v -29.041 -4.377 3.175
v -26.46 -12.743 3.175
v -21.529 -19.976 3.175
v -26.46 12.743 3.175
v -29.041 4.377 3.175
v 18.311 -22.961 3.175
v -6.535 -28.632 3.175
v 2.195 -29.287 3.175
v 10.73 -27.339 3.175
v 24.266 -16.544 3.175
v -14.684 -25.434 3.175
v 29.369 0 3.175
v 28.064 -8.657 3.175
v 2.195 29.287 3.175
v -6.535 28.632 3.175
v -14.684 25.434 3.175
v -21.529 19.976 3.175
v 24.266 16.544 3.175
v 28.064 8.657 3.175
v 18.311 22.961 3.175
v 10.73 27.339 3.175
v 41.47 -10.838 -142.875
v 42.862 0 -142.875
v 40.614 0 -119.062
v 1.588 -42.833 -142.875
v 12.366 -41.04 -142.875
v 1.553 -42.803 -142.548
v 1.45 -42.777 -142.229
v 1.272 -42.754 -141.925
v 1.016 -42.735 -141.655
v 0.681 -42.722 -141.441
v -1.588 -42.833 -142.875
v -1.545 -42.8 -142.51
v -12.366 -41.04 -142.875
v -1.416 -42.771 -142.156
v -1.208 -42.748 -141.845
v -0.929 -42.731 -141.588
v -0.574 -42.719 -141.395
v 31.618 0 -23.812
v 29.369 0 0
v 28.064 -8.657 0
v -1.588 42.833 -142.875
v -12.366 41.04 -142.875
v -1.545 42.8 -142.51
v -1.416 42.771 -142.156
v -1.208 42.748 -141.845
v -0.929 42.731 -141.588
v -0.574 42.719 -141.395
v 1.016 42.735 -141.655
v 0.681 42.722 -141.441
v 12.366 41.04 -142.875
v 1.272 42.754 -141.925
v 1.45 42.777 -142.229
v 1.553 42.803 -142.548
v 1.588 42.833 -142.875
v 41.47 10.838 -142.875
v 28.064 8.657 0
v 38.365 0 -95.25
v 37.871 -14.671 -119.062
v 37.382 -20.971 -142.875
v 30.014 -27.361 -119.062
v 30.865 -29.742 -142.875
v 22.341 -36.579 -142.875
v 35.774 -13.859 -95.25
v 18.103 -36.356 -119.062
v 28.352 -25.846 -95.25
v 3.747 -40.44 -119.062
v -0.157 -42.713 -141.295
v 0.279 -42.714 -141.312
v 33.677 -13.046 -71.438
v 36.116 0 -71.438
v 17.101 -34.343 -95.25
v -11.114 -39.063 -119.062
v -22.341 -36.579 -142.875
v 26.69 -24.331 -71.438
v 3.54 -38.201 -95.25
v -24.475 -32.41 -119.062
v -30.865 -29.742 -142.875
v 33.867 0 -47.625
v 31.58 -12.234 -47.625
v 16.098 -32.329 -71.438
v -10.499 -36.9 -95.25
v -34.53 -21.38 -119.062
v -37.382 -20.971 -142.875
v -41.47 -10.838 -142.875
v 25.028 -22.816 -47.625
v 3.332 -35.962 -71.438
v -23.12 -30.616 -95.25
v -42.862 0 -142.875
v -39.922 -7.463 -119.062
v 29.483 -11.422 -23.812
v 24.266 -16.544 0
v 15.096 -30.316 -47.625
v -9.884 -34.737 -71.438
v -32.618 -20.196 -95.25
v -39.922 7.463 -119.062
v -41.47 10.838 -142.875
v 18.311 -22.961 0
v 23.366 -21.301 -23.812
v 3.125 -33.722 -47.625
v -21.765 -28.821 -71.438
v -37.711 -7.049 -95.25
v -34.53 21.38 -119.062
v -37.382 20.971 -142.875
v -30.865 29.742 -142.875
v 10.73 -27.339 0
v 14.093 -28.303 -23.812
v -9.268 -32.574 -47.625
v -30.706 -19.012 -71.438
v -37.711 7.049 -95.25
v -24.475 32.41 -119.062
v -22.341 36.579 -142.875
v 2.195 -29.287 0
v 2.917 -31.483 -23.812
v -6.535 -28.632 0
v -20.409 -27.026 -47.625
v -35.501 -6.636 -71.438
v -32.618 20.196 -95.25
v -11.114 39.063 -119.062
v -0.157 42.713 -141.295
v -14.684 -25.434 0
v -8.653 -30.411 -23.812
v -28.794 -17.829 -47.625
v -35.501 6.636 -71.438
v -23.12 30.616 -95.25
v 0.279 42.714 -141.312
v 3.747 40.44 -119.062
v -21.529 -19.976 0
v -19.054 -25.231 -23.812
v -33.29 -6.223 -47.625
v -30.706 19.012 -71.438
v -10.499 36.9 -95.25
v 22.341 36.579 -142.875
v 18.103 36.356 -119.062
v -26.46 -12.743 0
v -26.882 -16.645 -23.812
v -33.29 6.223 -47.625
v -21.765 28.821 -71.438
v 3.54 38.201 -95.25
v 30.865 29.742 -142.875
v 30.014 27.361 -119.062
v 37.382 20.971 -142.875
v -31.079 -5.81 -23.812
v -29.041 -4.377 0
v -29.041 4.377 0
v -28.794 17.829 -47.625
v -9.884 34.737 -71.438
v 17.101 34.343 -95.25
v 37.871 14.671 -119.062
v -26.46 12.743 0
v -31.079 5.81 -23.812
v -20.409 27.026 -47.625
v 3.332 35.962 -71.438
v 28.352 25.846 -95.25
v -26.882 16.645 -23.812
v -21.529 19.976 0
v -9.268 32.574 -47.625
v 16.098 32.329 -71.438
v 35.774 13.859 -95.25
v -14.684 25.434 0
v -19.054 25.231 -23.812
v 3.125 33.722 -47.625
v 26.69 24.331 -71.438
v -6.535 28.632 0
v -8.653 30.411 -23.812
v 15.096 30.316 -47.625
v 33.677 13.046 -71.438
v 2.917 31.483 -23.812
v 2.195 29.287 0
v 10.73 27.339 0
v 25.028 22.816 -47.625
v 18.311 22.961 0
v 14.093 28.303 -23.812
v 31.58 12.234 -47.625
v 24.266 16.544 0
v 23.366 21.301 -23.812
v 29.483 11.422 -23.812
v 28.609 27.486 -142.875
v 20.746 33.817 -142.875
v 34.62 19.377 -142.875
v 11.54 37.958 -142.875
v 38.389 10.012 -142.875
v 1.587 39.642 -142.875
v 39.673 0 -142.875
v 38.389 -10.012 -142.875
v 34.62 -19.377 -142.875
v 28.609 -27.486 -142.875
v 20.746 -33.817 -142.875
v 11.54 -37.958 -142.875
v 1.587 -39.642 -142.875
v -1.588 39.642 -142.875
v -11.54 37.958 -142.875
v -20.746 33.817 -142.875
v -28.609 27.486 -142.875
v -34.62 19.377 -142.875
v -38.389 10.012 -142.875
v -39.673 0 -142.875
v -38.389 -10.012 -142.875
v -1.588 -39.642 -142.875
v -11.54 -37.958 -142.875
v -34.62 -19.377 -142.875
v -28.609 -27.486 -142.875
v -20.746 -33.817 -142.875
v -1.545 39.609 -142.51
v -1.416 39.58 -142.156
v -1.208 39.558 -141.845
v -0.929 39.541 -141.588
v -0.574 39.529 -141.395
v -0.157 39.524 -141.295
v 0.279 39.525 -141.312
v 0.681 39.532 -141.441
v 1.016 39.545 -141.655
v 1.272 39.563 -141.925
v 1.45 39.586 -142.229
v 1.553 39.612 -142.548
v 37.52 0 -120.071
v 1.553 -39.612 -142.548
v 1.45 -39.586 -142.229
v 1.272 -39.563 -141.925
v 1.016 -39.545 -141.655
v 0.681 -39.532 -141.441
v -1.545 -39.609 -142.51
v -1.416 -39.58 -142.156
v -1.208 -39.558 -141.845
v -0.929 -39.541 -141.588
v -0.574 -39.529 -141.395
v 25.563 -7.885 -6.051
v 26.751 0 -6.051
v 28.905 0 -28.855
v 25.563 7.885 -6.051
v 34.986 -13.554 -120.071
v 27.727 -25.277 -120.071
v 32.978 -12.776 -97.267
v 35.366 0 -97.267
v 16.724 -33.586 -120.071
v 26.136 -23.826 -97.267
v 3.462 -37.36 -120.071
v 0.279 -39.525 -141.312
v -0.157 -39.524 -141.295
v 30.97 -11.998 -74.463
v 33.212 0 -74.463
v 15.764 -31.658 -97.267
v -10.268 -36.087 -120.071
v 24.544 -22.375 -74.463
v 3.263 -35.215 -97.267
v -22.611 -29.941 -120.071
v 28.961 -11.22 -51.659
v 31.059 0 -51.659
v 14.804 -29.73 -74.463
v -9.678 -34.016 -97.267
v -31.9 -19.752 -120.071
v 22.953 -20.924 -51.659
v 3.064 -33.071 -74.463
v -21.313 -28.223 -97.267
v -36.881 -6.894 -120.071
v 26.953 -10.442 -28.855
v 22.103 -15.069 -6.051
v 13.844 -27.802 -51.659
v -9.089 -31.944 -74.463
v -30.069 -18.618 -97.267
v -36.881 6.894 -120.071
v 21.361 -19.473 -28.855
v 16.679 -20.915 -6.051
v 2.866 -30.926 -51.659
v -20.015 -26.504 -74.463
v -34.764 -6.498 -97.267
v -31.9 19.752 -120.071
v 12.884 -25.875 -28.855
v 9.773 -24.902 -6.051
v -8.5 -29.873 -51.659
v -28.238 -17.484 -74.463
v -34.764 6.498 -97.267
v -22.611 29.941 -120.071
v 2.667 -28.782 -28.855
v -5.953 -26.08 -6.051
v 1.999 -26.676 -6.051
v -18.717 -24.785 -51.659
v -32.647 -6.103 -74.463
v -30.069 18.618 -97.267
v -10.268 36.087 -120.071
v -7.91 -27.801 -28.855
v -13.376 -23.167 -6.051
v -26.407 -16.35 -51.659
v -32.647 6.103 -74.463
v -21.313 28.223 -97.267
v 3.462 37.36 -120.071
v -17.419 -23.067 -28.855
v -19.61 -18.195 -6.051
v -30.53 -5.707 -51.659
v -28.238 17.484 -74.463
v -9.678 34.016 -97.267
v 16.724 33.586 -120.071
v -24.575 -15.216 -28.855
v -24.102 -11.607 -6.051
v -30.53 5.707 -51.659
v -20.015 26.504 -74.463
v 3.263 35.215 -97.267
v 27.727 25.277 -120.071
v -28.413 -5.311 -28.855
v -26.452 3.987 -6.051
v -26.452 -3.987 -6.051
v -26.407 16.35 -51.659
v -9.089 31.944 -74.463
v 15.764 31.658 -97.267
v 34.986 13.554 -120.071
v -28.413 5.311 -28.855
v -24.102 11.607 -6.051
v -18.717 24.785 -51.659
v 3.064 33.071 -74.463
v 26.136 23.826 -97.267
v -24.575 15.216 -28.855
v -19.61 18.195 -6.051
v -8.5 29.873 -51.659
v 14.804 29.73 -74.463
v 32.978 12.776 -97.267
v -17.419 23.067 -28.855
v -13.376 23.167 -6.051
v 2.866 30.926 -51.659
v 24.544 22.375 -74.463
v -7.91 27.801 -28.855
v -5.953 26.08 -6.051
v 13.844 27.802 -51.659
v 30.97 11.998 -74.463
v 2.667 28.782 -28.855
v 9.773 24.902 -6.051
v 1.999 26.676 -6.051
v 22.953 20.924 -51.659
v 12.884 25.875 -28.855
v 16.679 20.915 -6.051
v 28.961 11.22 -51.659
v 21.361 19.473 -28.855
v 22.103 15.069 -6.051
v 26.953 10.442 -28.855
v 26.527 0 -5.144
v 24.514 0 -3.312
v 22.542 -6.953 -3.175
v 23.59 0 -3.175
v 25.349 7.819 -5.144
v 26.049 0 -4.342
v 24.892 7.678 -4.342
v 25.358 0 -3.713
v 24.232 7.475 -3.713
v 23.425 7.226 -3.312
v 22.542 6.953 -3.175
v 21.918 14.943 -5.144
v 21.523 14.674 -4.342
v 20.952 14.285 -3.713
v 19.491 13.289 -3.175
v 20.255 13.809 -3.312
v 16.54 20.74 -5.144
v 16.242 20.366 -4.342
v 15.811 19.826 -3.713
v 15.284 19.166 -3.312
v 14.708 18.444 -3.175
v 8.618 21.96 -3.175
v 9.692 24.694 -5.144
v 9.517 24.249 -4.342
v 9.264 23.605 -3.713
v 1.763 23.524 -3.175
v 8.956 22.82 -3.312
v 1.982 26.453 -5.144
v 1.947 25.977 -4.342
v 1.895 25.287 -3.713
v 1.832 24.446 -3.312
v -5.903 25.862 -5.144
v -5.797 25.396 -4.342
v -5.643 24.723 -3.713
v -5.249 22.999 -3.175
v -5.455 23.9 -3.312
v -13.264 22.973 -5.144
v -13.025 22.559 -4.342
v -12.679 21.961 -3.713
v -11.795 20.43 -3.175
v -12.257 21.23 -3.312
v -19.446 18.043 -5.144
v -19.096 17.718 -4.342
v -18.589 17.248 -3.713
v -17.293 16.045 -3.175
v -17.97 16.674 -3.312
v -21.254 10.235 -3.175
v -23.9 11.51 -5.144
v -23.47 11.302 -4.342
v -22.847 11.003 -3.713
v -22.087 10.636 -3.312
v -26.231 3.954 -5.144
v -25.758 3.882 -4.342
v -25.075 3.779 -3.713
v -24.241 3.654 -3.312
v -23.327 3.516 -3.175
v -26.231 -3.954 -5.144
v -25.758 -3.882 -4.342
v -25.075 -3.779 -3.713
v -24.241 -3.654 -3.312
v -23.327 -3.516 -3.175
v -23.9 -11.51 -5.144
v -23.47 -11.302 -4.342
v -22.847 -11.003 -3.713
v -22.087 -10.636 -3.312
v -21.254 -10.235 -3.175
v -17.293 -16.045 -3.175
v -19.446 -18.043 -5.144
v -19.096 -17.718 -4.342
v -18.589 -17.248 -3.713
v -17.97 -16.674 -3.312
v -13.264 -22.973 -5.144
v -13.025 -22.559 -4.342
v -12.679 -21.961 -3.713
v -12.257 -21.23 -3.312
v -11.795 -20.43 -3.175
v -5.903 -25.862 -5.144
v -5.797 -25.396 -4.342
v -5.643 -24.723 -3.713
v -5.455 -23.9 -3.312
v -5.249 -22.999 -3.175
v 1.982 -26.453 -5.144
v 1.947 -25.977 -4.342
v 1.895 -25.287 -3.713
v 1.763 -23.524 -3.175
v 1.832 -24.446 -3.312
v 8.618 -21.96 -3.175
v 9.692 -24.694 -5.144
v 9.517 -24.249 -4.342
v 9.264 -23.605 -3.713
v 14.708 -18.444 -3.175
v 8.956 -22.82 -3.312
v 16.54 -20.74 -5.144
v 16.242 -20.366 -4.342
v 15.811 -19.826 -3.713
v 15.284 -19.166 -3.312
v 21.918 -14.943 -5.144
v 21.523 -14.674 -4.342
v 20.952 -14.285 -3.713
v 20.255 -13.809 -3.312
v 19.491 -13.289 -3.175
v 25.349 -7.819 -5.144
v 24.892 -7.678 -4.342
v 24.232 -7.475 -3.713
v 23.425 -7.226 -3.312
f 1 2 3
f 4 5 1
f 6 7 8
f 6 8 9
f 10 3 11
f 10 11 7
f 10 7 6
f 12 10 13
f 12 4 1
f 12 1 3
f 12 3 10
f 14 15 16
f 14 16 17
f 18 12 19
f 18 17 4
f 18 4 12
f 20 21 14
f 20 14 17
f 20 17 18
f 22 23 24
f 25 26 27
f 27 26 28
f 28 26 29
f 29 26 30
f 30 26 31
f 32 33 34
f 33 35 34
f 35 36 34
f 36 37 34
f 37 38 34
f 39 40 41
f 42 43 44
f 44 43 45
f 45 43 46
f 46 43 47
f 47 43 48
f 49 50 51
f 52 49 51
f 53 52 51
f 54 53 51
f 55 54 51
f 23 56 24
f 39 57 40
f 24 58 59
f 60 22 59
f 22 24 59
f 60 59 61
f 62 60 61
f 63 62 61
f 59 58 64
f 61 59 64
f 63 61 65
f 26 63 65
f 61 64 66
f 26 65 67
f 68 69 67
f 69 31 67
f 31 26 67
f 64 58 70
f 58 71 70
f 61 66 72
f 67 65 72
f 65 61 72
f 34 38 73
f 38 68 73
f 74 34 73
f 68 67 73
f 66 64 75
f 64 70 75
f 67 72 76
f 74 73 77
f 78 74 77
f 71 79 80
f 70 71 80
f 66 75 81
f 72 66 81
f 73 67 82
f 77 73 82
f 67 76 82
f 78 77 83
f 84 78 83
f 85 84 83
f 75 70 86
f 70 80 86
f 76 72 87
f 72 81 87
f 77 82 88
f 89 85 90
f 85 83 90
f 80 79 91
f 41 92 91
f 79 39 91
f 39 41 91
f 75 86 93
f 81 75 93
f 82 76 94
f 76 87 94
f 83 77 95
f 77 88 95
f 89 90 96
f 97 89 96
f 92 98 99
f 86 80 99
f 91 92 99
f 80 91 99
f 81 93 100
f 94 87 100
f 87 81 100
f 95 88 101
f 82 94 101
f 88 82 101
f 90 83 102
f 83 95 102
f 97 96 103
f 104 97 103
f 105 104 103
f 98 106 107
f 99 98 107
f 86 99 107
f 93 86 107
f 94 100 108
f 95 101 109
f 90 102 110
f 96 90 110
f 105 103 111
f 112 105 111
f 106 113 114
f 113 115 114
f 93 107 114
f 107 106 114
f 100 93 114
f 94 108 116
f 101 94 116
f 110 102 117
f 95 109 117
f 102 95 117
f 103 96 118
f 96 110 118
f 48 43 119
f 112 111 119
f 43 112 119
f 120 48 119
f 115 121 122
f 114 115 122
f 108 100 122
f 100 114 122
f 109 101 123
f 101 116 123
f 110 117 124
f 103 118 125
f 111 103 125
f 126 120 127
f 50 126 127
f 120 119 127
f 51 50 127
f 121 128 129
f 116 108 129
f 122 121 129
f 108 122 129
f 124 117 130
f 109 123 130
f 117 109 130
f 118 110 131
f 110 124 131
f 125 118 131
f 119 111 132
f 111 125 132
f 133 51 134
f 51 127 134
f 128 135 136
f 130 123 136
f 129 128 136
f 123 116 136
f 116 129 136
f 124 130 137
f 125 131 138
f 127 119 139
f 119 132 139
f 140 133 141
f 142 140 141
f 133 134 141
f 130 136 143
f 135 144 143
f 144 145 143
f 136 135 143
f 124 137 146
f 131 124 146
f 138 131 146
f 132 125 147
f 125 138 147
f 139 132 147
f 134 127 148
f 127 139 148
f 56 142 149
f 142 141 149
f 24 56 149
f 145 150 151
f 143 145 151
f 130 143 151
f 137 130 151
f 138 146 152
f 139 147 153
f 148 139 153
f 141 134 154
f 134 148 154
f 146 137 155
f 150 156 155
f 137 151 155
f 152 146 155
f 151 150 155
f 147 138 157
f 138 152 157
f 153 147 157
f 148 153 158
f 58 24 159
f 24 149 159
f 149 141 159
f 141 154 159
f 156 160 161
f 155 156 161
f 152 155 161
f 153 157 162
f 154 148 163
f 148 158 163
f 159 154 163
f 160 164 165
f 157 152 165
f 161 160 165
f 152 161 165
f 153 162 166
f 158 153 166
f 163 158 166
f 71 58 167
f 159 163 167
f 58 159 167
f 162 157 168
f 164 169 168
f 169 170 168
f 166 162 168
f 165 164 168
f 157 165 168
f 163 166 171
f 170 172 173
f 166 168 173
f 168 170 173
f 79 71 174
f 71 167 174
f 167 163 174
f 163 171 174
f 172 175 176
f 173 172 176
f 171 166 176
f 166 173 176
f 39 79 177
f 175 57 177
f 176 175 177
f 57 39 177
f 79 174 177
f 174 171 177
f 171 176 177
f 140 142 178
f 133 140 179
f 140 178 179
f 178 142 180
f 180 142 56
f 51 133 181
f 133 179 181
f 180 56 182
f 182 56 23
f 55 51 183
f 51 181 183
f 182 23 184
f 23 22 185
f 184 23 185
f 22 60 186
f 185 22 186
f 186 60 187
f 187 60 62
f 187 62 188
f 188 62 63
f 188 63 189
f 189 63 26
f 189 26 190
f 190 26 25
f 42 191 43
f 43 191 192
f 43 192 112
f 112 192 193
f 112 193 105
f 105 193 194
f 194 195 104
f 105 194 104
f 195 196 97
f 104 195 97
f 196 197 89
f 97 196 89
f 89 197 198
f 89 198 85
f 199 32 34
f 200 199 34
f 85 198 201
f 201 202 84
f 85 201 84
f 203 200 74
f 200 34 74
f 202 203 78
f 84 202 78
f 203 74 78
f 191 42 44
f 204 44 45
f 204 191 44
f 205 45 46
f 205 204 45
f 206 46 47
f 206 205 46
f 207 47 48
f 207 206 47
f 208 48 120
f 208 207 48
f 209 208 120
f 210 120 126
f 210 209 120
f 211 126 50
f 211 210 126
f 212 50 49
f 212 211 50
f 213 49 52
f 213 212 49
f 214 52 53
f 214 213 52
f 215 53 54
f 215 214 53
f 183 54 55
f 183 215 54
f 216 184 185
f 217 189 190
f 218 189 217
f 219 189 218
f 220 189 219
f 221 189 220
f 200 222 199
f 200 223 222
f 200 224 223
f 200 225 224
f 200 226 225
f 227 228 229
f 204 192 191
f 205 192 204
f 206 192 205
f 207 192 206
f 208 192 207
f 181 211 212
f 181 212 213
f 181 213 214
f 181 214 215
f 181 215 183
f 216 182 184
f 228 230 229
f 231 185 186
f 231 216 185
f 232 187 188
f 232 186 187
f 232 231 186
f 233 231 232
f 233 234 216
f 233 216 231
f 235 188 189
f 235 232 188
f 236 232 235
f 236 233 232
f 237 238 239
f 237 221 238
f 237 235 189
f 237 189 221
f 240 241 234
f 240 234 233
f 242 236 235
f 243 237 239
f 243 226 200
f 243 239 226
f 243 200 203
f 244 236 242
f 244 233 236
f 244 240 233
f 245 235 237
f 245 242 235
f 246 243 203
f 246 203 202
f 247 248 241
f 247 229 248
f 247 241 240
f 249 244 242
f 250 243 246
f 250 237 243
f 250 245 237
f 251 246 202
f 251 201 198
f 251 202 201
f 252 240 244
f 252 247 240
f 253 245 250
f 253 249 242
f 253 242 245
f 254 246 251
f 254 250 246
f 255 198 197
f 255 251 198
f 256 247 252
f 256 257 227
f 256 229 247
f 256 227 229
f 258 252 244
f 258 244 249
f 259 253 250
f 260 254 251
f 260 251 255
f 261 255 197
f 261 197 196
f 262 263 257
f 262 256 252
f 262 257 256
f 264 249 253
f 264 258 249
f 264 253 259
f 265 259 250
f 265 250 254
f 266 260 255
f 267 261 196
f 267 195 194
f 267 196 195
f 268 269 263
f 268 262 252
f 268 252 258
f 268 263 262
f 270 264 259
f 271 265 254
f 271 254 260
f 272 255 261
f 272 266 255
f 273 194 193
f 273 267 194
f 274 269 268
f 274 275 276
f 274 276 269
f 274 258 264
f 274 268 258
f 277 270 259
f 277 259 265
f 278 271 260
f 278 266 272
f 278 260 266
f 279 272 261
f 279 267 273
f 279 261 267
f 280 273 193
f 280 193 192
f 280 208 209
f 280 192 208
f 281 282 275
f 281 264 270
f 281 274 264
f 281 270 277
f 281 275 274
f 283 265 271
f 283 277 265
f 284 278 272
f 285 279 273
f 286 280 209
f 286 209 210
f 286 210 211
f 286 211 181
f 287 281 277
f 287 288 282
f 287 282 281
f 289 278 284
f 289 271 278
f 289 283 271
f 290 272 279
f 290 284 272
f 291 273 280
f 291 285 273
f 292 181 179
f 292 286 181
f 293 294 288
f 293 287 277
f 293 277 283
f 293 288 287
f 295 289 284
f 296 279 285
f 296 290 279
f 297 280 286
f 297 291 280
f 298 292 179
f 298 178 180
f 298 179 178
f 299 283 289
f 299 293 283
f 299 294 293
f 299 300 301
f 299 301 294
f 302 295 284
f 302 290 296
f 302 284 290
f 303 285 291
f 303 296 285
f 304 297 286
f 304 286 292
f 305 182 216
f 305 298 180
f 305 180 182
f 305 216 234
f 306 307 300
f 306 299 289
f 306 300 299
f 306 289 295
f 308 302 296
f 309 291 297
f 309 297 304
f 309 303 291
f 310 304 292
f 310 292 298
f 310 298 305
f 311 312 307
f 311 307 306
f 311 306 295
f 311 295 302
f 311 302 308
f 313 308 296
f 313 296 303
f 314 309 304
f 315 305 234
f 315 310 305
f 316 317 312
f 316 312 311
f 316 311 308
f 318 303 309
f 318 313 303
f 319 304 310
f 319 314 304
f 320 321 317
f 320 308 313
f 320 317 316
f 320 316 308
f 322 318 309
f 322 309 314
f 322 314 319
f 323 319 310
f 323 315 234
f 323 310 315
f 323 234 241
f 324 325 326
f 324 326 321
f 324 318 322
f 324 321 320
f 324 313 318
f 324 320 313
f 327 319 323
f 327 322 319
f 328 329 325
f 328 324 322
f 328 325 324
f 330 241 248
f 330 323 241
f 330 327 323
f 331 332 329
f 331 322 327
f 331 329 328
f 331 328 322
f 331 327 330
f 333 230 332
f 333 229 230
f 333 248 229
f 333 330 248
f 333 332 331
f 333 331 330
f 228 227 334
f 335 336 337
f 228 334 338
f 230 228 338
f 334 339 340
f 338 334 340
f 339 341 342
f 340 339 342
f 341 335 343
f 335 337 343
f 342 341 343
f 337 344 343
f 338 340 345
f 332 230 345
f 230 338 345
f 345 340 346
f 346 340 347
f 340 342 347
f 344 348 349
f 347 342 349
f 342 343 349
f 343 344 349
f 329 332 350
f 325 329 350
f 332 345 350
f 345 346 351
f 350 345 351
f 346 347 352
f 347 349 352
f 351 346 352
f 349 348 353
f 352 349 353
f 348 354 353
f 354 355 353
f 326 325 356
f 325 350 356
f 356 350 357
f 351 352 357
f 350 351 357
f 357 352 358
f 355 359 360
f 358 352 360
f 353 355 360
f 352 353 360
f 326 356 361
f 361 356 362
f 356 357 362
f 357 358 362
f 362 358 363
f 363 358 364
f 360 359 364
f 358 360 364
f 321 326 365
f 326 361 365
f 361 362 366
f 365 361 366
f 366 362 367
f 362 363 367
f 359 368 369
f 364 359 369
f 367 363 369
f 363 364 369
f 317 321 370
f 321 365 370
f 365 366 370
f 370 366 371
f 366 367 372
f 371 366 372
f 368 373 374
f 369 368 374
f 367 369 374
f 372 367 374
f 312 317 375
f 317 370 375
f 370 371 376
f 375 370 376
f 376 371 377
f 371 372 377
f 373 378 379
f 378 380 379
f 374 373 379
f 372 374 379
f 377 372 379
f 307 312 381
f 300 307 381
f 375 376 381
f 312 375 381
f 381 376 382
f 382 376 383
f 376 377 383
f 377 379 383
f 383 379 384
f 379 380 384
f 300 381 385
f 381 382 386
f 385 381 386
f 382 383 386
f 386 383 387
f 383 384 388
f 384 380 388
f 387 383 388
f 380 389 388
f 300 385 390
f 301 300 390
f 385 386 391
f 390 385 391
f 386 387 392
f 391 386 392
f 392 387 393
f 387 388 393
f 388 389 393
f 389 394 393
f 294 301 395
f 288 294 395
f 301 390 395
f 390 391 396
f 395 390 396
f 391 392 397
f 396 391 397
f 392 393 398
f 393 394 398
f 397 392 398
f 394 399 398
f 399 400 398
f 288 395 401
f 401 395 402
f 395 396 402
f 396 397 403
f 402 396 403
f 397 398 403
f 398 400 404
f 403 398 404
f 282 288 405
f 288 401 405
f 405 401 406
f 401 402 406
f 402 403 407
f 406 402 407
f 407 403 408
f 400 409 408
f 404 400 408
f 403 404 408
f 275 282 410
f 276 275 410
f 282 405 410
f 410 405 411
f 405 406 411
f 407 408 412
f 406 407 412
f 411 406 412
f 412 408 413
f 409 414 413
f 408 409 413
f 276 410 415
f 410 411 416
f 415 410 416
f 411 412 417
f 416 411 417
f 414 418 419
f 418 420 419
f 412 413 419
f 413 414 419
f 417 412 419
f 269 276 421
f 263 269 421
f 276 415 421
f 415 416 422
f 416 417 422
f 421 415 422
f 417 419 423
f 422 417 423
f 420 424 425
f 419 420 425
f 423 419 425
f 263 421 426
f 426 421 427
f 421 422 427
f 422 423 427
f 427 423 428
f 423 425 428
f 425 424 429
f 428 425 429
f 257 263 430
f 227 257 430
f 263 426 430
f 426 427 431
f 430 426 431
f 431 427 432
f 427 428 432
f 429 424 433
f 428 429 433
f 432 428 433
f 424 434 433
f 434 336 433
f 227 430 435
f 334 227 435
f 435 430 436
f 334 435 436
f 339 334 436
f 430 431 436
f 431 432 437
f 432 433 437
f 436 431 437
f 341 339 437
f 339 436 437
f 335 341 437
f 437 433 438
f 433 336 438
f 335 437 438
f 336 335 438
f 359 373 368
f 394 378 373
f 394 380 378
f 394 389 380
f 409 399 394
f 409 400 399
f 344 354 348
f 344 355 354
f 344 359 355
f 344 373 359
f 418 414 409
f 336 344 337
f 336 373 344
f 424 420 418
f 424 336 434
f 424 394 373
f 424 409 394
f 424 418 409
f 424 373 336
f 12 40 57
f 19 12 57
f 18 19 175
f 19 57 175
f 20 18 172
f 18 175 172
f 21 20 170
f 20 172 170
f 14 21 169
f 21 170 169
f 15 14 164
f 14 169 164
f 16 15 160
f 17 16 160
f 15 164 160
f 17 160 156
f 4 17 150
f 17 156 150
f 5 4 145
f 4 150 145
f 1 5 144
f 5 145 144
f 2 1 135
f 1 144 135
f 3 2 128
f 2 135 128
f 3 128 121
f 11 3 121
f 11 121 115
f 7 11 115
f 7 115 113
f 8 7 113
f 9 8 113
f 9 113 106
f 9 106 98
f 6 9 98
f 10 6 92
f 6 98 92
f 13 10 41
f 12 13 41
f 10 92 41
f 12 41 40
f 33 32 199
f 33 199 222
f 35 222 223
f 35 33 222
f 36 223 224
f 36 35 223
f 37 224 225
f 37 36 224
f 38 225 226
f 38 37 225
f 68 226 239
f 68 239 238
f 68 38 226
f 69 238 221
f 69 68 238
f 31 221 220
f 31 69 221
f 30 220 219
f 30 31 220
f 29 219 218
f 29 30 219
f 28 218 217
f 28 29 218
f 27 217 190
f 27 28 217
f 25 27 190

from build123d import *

# Parameters (mm, degrees)
SHELL3_T                = -3.175
SKETCH5_R               = 29.36875
BOSS_EXTRUDE1_DEPTH     = 3.175
FILLET1_R               = 3.175
CUT_EXTRUDE1_DEPTH      = 156.201976268
CUT_EXTRUDE1_DEPTH_BACK = 156.201976268
SKETCH6_R               = 1.5875


with BuildPart() as part:
    # Sketch2 → Revolve1 (revolve)
    with BuildSketch(Plane(origin=(0, 0, 0), x_dir=(1, 0, 0), z_dir=(0, 1, 0))):
        Polygon((29.36875, 0), (0, 0), (0, 142.875), (42.8625, 142.875), align=None)
    revolve(axis=Axis((0, 0, 0), (0, 0, -1)))

    # Shell3
    shell3_openings = [part.faces().sort_by_distance(p)[0] for p in [
        (0, 0, -142.875),
    ]]
    offset(amount=SHELL3_T, openings=shell3_openings, kind=Kind.INTERSECTION)

    # Sketch5 → Boss-Extrude1 (add)
    with BuildSketch(Plane.XY):
        Circle(SKETCH5_R)
    extrude(amount=BOSS_EXTRUDE1_DEPTH)

    # Fillet1
    fillet1_edges = [part.edges().sort_by_distance(p)[0] for p in [
        (-26.479482439, 0, -3.175),
    ]]
    fillet(fillet1_edges, radius=FILLET1_R)

    # Sketch6 → Cut-Extrude1 (cut, two sides: drawn at the far end of the back side and taken through both)
    with BuildSketch(Plane(origin=(0, 0, 0), x_dir=(1, 0, 0), z_dir=(0, 1, 0)).offset(-CUT_EXTRUDE1_DEPTH_BACK)):
        with Locations((0, 142.875)):
            Circle(SKETCH6_R)
    extrude(amount=CUT_EXTRUDE1_DEPTH + CUT_EXTRUDE1_DEPTH_BACK, mode=Mode.SUBTRACT)


solid = part.part
